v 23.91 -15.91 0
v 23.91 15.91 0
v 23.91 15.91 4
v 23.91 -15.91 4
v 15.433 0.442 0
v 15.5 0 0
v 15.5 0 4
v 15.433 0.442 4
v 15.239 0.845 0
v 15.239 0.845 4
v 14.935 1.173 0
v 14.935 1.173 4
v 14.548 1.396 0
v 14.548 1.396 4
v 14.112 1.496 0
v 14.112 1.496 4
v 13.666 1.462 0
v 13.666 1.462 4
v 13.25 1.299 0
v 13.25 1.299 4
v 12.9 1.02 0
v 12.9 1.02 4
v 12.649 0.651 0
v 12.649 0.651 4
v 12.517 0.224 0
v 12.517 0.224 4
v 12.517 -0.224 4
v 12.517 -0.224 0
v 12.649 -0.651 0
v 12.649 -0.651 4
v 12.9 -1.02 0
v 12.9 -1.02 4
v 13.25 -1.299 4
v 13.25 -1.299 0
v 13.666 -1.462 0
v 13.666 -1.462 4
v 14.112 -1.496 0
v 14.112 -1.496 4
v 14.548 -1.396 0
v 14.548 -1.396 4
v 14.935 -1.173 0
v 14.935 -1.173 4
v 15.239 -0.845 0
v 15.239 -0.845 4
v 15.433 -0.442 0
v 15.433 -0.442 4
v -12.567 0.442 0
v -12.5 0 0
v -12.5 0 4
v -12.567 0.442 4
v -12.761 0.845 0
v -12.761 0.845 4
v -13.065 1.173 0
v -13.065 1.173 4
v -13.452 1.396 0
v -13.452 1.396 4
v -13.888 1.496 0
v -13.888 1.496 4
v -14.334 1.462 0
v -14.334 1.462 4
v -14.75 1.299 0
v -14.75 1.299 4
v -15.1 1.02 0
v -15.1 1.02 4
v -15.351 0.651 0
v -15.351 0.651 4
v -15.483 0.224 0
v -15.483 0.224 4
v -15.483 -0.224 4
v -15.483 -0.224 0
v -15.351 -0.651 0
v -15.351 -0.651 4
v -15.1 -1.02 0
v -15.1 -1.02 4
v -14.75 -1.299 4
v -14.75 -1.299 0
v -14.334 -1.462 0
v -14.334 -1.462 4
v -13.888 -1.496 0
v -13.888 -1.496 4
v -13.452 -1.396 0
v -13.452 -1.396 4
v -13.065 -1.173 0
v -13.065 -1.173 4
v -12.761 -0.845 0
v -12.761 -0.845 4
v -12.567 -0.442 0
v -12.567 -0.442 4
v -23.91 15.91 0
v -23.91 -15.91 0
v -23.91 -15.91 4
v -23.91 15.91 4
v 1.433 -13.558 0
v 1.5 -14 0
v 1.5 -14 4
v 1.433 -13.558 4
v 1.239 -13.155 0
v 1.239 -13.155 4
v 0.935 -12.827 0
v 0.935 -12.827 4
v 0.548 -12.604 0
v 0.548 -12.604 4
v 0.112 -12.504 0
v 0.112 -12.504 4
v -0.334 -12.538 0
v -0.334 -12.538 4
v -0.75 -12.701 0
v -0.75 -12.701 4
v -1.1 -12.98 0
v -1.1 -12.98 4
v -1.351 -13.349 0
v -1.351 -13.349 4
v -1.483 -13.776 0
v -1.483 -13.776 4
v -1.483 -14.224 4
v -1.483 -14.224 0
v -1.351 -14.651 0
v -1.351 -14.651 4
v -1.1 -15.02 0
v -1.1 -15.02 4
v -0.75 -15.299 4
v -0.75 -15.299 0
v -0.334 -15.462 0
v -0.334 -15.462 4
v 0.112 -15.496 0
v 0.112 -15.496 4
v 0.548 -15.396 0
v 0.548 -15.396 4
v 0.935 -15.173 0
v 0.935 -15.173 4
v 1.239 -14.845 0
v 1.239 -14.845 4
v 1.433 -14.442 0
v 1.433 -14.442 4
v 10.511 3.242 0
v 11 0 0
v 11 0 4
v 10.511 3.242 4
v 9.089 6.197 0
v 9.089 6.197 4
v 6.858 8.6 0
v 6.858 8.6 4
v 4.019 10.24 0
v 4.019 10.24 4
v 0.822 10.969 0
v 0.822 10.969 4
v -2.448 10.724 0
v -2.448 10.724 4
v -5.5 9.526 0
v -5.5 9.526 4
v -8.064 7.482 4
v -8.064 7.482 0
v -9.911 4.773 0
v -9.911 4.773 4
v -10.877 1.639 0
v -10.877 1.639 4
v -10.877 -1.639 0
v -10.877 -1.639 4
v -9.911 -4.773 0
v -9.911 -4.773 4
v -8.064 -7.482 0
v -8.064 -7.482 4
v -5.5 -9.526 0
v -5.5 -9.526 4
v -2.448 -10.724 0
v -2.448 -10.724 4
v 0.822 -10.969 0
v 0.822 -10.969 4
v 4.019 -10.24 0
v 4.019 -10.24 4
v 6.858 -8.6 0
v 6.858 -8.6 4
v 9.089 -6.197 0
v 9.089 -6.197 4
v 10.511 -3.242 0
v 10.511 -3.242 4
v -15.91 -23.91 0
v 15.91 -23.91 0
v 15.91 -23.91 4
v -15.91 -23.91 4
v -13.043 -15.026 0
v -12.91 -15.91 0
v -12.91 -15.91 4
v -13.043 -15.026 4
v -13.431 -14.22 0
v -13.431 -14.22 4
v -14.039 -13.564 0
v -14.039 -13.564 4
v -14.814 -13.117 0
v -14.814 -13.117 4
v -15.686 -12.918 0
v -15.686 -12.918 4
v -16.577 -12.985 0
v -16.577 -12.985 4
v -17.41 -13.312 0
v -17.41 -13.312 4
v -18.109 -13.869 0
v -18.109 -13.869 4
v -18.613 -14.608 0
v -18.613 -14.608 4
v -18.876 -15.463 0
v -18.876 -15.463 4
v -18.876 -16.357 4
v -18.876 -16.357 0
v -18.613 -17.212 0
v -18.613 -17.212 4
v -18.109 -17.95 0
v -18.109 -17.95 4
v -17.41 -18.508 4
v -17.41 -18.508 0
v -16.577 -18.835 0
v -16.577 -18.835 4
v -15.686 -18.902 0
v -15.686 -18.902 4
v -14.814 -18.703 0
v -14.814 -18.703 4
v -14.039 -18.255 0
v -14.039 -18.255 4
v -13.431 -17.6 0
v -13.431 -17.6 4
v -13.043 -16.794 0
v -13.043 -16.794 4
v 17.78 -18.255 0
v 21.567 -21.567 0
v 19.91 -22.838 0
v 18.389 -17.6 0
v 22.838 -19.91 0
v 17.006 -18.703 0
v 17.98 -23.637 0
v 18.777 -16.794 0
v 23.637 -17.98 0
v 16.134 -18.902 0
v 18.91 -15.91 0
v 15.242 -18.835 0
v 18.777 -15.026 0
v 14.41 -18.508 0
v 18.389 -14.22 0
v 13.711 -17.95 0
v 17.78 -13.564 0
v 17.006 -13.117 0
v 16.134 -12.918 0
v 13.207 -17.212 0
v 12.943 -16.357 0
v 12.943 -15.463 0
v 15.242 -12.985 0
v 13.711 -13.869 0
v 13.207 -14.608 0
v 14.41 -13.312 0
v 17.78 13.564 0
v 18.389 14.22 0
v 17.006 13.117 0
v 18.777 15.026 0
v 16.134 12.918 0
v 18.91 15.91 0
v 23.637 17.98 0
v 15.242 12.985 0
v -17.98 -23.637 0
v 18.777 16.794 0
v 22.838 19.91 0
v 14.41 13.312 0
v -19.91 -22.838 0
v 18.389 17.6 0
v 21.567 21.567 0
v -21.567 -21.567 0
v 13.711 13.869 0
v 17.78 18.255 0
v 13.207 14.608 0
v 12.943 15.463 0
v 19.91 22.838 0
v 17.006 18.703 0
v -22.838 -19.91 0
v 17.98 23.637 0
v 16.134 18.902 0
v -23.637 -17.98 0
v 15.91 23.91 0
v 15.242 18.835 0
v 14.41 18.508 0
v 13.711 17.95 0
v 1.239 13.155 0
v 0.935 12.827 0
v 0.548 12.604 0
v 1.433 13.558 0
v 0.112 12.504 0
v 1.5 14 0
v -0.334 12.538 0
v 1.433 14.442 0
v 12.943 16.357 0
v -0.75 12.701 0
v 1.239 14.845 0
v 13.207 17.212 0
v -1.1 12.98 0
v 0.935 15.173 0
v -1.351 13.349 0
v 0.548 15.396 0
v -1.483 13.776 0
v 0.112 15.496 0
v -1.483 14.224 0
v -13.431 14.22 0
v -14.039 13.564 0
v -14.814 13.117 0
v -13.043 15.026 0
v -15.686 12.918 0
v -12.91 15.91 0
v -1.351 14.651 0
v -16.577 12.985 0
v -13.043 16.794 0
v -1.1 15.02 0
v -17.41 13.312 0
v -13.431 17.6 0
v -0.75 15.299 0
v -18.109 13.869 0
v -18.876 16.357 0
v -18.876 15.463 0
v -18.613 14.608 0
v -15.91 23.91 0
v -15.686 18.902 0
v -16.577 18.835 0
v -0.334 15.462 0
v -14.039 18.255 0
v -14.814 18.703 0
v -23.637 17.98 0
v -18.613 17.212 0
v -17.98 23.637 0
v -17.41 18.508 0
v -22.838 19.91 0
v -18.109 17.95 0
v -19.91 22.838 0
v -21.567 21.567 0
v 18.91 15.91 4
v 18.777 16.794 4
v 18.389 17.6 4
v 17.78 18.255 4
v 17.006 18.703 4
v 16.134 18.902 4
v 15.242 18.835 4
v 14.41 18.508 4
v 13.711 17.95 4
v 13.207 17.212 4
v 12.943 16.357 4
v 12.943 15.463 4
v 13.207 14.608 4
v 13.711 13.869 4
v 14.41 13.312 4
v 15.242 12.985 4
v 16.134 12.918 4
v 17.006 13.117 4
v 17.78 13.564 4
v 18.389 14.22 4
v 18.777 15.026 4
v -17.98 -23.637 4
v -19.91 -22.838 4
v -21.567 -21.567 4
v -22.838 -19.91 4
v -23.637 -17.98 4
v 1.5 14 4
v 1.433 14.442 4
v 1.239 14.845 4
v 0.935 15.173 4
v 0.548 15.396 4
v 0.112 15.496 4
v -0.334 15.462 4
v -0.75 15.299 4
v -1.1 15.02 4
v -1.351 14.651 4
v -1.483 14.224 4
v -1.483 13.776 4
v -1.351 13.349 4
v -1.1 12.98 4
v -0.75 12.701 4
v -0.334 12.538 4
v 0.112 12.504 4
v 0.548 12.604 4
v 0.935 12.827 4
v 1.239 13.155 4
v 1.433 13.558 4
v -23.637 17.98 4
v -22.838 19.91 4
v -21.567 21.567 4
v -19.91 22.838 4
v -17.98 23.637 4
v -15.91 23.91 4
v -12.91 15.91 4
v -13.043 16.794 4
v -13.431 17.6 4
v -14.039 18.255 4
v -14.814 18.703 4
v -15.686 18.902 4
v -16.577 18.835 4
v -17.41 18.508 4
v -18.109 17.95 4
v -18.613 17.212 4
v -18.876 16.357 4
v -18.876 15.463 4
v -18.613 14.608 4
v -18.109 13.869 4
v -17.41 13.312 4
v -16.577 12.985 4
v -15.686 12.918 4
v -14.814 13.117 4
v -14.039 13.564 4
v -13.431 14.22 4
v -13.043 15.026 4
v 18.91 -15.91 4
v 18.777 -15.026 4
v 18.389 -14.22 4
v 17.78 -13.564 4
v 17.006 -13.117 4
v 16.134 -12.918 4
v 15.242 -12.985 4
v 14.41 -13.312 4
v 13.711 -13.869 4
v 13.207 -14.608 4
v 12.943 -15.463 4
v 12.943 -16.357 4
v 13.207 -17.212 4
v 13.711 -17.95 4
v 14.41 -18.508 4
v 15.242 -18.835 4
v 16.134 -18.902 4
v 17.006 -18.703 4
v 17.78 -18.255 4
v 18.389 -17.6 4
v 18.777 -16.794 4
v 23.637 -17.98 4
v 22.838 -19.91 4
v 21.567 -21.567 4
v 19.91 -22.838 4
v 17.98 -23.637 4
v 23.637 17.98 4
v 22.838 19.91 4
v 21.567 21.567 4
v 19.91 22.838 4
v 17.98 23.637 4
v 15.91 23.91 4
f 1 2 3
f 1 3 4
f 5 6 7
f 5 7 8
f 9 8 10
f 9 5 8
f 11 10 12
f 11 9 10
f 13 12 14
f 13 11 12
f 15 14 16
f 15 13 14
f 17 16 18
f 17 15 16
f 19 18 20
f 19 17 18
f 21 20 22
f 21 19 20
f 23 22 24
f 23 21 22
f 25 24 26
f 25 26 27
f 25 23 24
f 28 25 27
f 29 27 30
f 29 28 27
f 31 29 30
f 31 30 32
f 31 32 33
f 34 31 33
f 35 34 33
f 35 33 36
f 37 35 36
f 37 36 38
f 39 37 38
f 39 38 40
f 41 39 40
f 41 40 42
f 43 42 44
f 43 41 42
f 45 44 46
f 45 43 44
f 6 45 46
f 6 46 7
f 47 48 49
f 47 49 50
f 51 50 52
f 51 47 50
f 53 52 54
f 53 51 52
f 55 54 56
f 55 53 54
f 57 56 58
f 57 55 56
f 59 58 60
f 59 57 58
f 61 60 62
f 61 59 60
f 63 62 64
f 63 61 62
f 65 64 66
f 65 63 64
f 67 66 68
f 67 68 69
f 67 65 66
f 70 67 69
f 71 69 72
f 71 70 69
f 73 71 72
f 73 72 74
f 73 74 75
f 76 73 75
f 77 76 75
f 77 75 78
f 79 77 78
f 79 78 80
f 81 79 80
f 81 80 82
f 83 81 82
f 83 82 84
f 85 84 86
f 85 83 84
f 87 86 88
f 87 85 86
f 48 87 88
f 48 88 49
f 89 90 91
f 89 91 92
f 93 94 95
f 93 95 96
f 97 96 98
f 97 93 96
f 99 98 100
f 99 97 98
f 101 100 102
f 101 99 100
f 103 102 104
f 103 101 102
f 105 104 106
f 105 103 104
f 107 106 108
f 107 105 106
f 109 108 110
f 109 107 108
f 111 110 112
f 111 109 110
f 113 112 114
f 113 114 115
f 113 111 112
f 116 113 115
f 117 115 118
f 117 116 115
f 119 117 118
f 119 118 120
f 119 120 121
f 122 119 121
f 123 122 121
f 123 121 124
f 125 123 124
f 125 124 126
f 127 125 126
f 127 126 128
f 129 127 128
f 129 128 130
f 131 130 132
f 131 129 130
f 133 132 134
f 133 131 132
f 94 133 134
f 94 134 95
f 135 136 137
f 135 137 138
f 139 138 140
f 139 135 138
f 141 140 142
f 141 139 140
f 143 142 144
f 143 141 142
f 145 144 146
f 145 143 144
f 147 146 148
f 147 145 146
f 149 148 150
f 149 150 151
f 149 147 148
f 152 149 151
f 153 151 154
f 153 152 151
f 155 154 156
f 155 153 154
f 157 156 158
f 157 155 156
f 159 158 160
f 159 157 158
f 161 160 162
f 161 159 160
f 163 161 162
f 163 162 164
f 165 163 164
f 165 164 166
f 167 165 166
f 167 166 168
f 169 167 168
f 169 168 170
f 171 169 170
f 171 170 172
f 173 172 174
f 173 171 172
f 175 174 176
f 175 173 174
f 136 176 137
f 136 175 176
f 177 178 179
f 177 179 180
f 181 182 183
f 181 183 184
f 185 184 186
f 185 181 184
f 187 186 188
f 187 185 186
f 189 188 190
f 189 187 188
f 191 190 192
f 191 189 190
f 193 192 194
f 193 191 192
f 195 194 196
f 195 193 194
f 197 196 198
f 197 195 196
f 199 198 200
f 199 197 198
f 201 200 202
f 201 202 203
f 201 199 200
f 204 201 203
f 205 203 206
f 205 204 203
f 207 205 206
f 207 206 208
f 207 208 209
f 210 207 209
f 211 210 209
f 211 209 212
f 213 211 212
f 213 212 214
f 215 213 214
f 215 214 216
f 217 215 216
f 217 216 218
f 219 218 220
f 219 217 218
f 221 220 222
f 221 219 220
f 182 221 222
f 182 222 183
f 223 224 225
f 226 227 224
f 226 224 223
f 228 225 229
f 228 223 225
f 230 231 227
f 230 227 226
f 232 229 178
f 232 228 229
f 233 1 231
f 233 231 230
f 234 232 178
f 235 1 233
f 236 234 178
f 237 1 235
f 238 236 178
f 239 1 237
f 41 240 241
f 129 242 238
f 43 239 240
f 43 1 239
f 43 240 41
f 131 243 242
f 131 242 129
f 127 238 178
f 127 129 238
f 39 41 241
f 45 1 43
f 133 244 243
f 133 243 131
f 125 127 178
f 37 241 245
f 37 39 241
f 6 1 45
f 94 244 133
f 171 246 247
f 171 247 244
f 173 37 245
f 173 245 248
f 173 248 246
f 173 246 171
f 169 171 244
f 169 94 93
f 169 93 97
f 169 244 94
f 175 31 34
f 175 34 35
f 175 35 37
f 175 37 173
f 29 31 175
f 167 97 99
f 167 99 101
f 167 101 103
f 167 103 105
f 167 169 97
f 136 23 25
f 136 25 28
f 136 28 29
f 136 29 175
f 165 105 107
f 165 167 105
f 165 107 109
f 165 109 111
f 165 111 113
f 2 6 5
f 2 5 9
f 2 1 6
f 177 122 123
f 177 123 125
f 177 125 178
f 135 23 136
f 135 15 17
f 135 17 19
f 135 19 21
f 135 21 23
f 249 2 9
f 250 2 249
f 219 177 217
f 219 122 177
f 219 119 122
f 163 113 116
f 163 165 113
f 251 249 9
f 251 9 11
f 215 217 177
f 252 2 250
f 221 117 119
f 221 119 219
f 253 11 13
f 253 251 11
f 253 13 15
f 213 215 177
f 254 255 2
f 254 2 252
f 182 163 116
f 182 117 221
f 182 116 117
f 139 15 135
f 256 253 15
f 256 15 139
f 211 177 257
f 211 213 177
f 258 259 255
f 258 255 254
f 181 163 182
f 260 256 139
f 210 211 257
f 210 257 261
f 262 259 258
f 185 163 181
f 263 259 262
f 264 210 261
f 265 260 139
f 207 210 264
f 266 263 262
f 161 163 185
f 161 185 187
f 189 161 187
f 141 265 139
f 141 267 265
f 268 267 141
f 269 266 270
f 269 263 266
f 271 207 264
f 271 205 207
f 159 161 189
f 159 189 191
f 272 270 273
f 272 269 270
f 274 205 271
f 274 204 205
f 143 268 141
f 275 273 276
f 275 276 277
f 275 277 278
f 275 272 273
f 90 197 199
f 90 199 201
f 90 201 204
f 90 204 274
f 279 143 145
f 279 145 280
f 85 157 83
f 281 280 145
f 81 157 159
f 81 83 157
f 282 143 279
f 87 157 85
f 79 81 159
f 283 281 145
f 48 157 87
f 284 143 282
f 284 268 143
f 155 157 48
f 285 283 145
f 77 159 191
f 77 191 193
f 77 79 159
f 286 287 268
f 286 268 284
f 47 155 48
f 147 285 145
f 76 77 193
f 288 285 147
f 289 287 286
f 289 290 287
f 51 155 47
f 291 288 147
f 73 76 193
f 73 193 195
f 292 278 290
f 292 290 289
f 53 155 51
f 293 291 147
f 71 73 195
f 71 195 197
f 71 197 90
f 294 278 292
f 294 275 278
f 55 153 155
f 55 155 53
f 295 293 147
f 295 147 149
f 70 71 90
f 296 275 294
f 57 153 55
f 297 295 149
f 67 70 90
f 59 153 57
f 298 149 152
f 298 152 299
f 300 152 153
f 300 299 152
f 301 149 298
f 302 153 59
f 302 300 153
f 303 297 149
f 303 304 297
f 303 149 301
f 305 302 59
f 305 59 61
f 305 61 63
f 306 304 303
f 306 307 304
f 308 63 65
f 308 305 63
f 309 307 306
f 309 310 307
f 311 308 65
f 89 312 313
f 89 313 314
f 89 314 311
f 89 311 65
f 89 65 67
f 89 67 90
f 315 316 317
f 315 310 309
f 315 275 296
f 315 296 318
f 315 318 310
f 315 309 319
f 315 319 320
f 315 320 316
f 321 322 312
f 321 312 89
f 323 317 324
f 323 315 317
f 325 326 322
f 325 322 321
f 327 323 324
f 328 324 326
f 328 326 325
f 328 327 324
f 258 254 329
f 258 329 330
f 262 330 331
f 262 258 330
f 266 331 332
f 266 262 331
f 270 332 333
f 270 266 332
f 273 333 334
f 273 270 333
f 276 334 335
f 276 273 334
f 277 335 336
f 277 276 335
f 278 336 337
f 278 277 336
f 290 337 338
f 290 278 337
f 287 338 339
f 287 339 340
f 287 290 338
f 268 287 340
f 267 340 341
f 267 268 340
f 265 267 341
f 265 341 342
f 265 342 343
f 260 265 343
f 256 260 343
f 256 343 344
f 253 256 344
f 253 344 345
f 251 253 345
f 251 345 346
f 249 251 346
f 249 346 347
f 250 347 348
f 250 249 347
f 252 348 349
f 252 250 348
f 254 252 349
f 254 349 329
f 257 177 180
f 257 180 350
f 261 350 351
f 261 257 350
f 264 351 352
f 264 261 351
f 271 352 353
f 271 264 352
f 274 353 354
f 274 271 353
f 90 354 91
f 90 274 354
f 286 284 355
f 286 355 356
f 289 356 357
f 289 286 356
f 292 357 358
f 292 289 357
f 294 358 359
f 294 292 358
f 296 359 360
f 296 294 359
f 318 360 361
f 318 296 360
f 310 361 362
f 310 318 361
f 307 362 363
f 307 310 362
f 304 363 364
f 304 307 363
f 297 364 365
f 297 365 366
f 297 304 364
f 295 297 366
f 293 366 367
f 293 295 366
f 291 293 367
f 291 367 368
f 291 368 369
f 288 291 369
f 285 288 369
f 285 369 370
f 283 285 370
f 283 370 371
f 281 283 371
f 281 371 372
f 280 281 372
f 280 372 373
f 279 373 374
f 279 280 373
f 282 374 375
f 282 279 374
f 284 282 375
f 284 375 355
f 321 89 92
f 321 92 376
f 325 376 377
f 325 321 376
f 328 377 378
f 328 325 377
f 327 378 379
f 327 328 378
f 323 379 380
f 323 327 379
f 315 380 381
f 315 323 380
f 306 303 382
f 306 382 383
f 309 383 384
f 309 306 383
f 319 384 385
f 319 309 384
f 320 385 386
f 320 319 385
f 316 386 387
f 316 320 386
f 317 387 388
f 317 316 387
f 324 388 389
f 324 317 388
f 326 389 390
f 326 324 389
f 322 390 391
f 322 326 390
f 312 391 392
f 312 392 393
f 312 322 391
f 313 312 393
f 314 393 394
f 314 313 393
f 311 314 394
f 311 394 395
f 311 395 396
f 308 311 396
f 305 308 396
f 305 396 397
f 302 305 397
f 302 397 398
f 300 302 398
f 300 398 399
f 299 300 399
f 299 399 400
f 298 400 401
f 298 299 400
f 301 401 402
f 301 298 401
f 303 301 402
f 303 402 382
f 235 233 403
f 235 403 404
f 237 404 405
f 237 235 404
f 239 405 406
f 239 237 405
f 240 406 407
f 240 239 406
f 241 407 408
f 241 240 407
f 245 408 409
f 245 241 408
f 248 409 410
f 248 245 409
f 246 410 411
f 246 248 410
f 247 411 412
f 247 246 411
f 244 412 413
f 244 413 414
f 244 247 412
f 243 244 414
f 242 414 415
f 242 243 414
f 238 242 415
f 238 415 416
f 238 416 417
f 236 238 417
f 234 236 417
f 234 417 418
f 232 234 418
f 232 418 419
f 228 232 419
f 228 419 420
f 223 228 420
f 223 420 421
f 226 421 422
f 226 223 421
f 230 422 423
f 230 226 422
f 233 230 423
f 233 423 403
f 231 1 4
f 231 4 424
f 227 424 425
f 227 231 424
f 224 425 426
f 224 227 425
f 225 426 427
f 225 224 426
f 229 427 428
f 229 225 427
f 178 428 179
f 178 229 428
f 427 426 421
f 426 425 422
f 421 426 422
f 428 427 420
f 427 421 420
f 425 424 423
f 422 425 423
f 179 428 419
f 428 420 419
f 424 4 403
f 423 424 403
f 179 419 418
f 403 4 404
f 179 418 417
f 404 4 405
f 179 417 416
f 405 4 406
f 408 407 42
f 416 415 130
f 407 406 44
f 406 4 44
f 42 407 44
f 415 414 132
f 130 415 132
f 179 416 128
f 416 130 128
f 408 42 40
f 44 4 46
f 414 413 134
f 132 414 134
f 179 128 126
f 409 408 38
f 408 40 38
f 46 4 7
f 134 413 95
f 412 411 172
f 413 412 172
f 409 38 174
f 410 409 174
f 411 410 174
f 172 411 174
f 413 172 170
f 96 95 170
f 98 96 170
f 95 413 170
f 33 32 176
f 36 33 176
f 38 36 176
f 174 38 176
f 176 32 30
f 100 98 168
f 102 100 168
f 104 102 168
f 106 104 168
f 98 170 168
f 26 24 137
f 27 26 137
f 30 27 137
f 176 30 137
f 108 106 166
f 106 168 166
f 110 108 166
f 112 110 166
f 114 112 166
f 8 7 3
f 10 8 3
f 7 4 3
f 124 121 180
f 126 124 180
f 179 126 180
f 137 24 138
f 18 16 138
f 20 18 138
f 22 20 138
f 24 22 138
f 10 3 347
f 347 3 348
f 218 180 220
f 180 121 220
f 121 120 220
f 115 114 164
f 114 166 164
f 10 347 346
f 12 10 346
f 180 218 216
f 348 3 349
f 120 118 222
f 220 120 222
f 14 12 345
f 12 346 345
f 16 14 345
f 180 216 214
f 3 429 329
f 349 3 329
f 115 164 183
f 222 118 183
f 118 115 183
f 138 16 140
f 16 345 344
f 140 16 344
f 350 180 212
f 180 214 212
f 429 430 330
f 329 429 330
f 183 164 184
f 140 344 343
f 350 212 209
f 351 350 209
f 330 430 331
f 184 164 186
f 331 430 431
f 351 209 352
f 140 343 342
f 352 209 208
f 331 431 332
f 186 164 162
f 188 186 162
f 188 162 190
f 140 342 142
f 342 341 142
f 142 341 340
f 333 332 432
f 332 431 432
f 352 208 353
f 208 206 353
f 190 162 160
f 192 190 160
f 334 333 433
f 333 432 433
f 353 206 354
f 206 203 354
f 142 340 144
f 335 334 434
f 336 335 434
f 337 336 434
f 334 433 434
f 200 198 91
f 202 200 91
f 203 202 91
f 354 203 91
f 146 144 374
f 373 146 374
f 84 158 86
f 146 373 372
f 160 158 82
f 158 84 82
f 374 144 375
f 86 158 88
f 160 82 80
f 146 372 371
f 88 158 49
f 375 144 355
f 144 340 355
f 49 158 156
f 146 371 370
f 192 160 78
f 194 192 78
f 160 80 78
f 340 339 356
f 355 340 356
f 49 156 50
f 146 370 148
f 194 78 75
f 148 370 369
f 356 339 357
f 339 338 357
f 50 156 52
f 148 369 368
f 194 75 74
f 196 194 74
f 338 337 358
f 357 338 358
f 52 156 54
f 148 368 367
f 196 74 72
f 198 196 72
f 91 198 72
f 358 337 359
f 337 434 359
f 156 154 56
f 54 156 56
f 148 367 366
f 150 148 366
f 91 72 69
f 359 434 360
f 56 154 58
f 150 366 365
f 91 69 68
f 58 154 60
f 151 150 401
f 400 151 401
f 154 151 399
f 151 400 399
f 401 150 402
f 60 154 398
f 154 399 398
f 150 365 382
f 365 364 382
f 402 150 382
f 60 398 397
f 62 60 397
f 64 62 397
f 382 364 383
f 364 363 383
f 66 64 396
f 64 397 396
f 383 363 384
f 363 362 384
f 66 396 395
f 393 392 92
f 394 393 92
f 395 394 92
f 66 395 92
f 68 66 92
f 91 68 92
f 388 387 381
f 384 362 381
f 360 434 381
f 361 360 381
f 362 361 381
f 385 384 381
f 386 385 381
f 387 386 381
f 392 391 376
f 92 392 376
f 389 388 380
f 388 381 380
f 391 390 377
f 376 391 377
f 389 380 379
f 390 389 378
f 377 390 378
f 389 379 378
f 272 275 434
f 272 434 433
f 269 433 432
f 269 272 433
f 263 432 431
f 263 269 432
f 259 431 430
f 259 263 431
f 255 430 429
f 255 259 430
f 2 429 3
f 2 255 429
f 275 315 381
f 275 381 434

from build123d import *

# Parameters (mm, degrees)
SKETCH_1_R      = 11
SKETCH_1_R_2    = 1.5
SKETCH_1_R_3    = 3
EXTRUDE_1_DEPTH = 4


with BuildPart() as part:
    # 草图1 → 凸台-拉伸1 (new body)
    with BuildSketch(Plane.XY):
        with BuildLine():
            Line((-15.909902577, 23.909902577), (15.909902577, 23.909902577))
            ThreePointArc((15.909902577, 23.909902577), (21.566756826, 21.566756826), (23.909902577, 15.909902577))
            Line((23.909902577, 15.909902577), (23.909902577, -15.909902577))
            ThreePointArc((23.909902577, -15.909902577), (21.566756826, -21.566756826), (15.909902577, -23.909902577))
            Line((15.909902577, -23.909902577), (-15.909902577, -23.909902577))
            ThreePointArc((-15.909902577, -23.909902577), (-21.566756826, -21.566756826), (-23.909902577, -15.909902577))
            Line((-23.909902577, -15.909902577), (-23.909902577, 15.909902577))
            ThreePointArc((-23.909902577, 15.909902577), (-21.566756826, 21.566756826), (-15.909902577, 23.909902577))
        make_face()
        Circle(SKETCH_1_R, mode=Mode.SUBTRACT)
        with Locations((0, 14)):
            Circle(SKETCH_1_R_2, mode=Mode.SUBTRACT)
        with Locations((14, 0)):
            Circle(SKETCH_1_R_2, mode=Mode.SUBTRACT)
        with Locations((0, -14)):
            Circle(SKETCH_1_R_2, mode=Mode.SUBTRACT)
        with Locations((-14, 0)):
            Circle(SKETCH_1_R_2, mode=Mode.SUBTRACT)
        with Locations((15.909902577, 15.909902577)):
            Circle(SKETCH_1_R_3, mode=Mode.SUBTRACT)
        with Locations((15.909902577, -15.909902577)):
            Circle(SKETCH_1_R_3, mode=Mode.SUBTRACT)
        with Locations((-15.909902577, -15.909902577)):
            Circle(SKETCH_1_R_3, mode=Mode.SUBTRACT)
        with Locations((-15.909902577, 15.909902577)):
            Circle(SKETCH_1_R_3, mode=Mode.SUBTRACT)
    extrude(amount=EXTRUDE_1_DEPTH)


solid = part.part
